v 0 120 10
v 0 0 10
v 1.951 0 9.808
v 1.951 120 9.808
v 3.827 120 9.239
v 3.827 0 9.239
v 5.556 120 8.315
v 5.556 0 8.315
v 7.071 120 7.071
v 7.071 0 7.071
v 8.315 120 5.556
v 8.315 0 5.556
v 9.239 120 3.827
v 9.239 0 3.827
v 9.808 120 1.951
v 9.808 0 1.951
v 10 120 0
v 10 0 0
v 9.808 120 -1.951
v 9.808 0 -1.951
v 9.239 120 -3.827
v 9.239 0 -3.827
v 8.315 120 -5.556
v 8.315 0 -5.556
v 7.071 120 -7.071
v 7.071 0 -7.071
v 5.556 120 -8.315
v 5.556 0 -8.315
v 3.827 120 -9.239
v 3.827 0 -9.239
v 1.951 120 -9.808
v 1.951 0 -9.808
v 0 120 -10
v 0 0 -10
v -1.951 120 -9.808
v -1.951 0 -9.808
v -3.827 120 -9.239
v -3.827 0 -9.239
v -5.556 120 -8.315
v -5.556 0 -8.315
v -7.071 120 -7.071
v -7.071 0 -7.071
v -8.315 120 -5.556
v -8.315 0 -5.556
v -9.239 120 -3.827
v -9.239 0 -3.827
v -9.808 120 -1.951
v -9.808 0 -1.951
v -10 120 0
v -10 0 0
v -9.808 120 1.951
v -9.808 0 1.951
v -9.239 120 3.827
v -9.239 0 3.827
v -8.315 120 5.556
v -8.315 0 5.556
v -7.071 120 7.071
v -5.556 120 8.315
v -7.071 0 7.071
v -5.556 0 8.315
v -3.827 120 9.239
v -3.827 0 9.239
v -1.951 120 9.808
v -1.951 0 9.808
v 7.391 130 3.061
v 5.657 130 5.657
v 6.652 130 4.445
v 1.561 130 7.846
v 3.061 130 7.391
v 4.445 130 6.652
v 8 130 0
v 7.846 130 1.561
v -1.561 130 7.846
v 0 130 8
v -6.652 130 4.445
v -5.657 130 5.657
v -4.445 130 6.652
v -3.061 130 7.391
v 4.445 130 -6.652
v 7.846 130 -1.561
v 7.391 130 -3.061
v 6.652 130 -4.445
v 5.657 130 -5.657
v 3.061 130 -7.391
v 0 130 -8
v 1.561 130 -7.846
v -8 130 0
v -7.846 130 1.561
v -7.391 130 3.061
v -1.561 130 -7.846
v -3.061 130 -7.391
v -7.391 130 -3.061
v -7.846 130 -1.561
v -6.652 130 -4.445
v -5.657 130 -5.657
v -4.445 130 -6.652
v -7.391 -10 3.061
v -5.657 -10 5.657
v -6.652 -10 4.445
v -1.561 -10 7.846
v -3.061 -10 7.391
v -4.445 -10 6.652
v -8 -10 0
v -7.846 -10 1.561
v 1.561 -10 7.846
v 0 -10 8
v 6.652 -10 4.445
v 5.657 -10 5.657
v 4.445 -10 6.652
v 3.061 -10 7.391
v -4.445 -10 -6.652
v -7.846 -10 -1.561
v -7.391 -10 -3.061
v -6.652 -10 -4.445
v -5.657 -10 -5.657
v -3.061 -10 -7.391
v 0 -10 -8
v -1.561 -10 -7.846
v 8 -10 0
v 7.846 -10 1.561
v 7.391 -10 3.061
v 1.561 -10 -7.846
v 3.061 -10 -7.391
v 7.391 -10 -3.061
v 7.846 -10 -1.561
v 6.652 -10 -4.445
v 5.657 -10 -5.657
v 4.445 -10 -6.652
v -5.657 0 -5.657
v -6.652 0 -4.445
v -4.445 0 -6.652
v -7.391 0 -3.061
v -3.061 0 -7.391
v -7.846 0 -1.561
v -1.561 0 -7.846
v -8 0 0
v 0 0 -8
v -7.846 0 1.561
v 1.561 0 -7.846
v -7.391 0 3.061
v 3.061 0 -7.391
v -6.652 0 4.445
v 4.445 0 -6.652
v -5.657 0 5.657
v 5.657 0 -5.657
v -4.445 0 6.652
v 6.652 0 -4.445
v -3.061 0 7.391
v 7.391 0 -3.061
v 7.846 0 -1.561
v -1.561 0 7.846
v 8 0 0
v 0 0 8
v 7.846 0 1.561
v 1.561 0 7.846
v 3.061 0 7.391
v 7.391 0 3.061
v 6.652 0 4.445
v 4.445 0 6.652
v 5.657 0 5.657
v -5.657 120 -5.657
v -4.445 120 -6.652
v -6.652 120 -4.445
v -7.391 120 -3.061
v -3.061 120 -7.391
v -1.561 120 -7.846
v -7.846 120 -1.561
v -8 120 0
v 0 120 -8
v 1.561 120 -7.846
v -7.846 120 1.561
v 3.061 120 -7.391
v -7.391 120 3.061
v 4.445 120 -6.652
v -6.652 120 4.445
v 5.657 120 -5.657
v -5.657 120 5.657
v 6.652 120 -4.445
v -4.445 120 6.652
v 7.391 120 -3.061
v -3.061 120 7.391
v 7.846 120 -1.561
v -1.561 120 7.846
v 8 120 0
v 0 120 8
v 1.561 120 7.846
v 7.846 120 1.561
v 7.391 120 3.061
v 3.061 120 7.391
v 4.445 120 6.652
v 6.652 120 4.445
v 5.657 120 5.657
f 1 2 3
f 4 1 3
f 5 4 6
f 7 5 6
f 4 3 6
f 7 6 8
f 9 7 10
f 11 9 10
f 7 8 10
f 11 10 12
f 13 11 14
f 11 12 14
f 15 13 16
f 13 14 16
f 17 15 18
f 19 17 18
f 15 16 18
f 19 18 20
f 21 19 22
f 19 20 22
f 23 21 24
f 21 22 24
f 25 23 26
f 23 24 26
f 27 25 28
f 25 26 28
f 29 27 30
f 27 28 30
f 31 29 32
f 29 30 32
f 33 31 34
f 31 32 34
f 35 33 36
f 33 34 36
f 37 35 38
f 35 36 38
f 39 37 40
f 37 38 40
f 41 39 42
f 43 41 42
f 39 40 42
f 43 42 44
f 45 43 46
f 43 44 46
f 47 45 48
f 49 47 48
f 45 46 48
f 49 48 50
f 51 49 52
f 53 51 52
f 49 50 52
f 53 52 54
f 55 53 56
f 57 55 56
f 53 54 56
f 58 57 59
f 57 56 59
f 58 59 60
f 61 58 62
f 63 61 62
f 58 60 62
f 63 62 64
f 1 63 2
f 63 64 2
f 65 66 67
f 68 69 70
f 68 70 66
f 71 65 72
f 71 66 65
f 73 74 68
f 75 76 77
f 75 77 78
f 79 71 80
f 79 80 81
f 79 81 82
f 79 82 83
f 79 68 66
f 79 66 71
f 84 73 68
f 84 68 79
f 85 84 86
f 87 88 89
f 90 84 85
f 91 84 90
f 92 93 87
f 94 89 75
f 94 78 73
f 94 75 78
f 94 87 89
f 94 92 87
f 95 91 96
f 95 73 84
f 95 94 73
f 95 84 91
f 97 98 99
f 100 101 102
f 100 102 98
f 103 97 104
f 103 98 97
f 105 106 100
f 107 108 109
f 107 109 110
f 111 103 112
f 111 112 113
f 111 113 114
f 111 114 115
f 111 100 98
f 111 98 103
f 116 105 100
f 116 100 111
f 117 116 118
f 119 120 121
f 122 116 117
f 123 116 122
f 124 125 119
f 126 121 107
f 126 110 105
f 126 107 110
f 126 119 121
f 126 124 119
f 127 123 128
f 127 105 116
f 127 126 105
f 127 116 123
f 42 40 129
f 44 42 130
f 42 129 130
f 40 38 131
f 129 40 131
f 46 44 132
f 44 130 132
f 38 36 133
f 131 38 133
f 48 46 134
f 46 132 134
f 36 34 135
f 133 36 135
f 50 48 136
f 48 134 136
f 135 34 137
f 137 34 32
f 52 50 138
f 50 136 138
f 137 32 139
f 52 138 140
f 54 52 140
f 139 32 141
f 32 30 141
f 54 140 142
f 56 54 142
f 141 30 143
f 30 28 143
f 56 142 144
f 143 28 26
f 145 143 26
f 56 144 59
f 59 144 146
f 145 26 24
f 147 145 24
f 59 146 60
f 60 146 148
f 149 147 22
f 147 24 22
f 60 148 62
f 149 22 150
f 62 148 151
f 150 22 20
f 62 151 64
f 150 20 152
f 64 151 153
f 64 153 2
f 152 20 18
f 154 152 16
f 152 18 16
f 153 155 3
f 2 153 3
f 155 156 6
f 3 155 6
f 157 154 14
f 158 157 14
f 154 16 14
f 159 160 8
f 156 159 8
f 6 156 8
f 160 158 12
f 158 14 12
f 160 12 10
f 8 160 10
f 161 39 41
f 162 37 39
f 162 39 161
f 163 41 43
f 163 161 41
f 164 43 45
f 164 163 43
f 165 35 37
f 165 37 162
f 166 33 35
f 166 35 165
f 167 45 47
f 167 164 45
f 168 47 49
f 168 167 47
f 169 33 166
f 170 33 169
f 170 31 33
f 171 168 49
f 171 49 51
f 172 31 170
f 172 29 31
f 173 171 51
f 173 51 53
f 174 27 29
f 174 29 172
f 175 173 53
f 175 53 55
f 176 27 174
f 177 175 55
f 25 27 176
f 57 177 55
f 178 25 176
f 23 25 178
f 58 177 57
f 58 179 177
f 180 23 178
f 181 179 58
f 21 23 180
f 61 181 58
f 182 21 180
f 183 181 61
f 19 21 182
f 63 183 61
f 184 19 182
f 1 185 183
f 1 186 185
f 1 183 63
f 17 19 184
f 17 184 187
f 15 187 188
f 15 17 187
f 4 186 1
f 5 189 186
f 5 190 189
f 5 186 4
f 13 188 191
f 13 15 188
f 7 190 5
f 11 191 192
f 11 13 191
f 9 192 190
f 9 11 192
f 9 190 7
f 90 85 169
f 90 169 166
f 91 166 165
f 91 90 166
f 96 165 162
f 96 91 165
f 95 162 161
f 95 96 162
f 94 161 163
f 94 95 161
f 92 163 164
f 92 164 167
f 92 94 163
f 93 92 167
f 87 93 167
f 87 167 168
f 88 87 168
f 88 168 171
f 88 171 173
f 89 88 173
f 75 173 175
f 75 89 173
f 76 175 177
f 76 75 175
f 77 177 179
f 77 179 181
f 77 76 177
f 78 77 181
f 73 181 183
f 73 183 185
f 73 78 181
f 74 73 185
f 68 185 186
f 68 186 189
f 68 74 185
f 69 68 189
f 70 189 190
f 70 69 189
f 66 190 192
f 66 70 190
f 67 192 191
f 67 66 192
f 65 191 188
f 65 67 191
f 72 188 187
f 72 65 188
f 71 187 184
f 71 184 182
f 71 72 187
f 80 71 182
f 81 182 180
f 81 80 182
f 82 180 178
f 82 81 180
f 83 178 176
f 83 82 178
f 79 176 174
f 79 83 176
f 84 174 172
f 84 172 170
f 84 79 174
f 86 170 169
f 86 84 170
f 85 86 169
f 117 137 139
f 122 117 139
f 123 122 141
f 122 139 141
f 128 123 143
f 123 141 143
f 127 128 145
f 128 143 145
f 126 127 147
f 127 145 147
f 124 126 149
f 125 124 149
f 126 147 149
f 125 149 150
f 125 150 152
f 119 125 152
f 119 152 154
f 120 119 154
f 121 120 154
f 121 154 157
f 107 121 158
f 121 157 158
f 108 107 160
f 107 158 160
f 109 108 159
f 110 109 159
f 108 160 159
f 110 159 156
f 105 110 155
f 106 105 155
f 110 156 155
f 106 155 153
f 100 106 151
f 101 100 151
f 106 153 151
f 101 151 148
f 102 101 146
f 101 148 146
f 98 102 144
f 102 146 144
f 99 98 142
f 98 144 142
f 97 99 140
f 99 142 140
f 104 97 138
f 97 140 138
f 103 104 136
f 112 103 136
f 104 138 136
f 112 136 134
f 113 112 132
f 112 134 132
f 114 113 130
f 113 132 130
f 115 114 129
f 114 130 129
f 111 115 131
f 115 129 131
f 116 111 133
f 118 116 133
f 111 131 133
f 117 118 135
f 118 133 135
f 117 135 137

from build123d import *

# Parameters (mm, degrees)
ESQUISSE1_R        = 10
BOSS_EXTRU_1_DEPTH = 120
ESQUISSE2_R        = 8
BOSS_EXTRU_2_DEPTH = 10
BOSS_EXTRU_3_START = 10
ESQUISSE3_R        = 8
BOSS_EXTRU_3_DEPTH = 10


with BuildPart() as part:
    # Esquisse1 → Boss.-Extru.1 (new body)
    with BuildSketch(Plane(origin=(0, 0, 0), x_dir=(1, 0, 0), z_dir=(0, 1, 0))):
        with Locations(Location((0, 0, 0), (0, 0, 270))):
            Circle(ESQUISSE1_R)
    extrude(amount=BOSS_EXTRU_1_DEPTH)

    # Esquisse2 → Boss.-Extru.2 (add)
    with BuildSketch(Plane.XZ):
        with Locations(Location((0, 0, 0), (0, 0, 270))):
            Circle(ESQUISSE2_R)
    extrude(amount=BOSS_EXTRU_2_DEPTH)

    # Esquisse3 → Boss.-Extru.3 (add)
    with BuildSketch(Plane(origin=(0, 120, 0), x_dir=(1, 0, 0), z_dir=(0, 1, 0)).offset(BOSS_EXTRU_3_START)):
        with Locations(Location((0, 0, 0), (0, 0, 90))):
            Circle(ESQUISSE3_R)
    extrude(amount=-BOSS_EXTRU_3_DEPTH)


solid = part.part
